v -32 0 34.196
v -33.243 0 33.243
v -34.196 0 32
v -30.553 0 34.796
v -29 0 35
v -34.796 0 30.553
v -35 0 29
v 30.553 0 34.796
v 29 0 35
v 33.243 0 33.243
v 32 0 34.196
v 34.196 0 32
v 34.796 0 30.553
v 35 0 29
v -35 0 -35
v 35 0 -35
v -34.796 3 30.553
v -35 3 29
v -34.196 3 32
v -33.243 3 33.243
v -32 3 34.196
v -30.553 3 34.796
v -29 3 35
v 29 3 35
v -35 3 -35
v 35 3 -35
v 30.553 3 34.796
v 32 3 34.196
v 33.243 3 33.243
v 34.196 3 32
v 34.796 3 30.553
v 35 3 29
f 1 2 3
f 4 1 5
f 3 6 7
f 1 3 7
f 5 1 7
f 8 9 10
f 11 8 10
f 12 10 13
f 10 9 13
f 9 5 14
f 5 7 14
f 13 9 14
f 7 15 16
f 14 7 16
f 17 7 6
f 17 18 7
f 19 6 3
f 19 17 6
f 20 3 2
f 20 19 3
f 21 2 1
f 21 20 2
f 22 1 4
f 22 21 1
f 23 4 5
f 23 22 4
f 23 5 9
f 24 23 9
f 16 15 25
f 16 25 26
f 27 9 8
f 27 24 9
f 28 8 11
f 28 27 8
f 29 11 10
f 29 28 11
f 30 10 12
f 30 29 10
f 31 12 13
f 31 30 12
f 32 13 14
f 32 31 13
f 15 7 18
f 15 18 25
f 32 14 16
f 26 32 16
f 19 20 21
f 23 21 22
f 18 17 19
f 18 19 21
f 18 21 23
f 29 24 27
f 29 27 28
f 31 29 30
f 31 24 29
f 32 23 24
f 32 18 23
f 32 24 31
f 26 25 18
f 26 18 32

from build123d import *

# Parameters (mm, degrees)
SKETCH1_W           = 70
SKETCH1_H           = 70
BOSS_EXTRUDE1_DEPTH = 3
FILLET1_R           = 6


with BuildPart() as part:
    # Sketch1 → Boss-Extrude1 (new body)
    with BuildSketch(Plane(origin=(0, 0, 0), x_dir=(1, 0, 0), z_dir=(0, 1, 0))):
        Rectangle(SKETCH1_W, SKETCH1_H)
    extrude(amount=BOSS_EXTRUDE1_DEPTH)

    # Fillet1
    fillet1_edges = [part.edges().sort_by_distance(p)[0] for p in [
        (35, 1.5, 35),
        (-35, 1.5, 35),
    ]]
    fillet(fillet1_edges, radius=FILLET1_R)


solid = part.part
